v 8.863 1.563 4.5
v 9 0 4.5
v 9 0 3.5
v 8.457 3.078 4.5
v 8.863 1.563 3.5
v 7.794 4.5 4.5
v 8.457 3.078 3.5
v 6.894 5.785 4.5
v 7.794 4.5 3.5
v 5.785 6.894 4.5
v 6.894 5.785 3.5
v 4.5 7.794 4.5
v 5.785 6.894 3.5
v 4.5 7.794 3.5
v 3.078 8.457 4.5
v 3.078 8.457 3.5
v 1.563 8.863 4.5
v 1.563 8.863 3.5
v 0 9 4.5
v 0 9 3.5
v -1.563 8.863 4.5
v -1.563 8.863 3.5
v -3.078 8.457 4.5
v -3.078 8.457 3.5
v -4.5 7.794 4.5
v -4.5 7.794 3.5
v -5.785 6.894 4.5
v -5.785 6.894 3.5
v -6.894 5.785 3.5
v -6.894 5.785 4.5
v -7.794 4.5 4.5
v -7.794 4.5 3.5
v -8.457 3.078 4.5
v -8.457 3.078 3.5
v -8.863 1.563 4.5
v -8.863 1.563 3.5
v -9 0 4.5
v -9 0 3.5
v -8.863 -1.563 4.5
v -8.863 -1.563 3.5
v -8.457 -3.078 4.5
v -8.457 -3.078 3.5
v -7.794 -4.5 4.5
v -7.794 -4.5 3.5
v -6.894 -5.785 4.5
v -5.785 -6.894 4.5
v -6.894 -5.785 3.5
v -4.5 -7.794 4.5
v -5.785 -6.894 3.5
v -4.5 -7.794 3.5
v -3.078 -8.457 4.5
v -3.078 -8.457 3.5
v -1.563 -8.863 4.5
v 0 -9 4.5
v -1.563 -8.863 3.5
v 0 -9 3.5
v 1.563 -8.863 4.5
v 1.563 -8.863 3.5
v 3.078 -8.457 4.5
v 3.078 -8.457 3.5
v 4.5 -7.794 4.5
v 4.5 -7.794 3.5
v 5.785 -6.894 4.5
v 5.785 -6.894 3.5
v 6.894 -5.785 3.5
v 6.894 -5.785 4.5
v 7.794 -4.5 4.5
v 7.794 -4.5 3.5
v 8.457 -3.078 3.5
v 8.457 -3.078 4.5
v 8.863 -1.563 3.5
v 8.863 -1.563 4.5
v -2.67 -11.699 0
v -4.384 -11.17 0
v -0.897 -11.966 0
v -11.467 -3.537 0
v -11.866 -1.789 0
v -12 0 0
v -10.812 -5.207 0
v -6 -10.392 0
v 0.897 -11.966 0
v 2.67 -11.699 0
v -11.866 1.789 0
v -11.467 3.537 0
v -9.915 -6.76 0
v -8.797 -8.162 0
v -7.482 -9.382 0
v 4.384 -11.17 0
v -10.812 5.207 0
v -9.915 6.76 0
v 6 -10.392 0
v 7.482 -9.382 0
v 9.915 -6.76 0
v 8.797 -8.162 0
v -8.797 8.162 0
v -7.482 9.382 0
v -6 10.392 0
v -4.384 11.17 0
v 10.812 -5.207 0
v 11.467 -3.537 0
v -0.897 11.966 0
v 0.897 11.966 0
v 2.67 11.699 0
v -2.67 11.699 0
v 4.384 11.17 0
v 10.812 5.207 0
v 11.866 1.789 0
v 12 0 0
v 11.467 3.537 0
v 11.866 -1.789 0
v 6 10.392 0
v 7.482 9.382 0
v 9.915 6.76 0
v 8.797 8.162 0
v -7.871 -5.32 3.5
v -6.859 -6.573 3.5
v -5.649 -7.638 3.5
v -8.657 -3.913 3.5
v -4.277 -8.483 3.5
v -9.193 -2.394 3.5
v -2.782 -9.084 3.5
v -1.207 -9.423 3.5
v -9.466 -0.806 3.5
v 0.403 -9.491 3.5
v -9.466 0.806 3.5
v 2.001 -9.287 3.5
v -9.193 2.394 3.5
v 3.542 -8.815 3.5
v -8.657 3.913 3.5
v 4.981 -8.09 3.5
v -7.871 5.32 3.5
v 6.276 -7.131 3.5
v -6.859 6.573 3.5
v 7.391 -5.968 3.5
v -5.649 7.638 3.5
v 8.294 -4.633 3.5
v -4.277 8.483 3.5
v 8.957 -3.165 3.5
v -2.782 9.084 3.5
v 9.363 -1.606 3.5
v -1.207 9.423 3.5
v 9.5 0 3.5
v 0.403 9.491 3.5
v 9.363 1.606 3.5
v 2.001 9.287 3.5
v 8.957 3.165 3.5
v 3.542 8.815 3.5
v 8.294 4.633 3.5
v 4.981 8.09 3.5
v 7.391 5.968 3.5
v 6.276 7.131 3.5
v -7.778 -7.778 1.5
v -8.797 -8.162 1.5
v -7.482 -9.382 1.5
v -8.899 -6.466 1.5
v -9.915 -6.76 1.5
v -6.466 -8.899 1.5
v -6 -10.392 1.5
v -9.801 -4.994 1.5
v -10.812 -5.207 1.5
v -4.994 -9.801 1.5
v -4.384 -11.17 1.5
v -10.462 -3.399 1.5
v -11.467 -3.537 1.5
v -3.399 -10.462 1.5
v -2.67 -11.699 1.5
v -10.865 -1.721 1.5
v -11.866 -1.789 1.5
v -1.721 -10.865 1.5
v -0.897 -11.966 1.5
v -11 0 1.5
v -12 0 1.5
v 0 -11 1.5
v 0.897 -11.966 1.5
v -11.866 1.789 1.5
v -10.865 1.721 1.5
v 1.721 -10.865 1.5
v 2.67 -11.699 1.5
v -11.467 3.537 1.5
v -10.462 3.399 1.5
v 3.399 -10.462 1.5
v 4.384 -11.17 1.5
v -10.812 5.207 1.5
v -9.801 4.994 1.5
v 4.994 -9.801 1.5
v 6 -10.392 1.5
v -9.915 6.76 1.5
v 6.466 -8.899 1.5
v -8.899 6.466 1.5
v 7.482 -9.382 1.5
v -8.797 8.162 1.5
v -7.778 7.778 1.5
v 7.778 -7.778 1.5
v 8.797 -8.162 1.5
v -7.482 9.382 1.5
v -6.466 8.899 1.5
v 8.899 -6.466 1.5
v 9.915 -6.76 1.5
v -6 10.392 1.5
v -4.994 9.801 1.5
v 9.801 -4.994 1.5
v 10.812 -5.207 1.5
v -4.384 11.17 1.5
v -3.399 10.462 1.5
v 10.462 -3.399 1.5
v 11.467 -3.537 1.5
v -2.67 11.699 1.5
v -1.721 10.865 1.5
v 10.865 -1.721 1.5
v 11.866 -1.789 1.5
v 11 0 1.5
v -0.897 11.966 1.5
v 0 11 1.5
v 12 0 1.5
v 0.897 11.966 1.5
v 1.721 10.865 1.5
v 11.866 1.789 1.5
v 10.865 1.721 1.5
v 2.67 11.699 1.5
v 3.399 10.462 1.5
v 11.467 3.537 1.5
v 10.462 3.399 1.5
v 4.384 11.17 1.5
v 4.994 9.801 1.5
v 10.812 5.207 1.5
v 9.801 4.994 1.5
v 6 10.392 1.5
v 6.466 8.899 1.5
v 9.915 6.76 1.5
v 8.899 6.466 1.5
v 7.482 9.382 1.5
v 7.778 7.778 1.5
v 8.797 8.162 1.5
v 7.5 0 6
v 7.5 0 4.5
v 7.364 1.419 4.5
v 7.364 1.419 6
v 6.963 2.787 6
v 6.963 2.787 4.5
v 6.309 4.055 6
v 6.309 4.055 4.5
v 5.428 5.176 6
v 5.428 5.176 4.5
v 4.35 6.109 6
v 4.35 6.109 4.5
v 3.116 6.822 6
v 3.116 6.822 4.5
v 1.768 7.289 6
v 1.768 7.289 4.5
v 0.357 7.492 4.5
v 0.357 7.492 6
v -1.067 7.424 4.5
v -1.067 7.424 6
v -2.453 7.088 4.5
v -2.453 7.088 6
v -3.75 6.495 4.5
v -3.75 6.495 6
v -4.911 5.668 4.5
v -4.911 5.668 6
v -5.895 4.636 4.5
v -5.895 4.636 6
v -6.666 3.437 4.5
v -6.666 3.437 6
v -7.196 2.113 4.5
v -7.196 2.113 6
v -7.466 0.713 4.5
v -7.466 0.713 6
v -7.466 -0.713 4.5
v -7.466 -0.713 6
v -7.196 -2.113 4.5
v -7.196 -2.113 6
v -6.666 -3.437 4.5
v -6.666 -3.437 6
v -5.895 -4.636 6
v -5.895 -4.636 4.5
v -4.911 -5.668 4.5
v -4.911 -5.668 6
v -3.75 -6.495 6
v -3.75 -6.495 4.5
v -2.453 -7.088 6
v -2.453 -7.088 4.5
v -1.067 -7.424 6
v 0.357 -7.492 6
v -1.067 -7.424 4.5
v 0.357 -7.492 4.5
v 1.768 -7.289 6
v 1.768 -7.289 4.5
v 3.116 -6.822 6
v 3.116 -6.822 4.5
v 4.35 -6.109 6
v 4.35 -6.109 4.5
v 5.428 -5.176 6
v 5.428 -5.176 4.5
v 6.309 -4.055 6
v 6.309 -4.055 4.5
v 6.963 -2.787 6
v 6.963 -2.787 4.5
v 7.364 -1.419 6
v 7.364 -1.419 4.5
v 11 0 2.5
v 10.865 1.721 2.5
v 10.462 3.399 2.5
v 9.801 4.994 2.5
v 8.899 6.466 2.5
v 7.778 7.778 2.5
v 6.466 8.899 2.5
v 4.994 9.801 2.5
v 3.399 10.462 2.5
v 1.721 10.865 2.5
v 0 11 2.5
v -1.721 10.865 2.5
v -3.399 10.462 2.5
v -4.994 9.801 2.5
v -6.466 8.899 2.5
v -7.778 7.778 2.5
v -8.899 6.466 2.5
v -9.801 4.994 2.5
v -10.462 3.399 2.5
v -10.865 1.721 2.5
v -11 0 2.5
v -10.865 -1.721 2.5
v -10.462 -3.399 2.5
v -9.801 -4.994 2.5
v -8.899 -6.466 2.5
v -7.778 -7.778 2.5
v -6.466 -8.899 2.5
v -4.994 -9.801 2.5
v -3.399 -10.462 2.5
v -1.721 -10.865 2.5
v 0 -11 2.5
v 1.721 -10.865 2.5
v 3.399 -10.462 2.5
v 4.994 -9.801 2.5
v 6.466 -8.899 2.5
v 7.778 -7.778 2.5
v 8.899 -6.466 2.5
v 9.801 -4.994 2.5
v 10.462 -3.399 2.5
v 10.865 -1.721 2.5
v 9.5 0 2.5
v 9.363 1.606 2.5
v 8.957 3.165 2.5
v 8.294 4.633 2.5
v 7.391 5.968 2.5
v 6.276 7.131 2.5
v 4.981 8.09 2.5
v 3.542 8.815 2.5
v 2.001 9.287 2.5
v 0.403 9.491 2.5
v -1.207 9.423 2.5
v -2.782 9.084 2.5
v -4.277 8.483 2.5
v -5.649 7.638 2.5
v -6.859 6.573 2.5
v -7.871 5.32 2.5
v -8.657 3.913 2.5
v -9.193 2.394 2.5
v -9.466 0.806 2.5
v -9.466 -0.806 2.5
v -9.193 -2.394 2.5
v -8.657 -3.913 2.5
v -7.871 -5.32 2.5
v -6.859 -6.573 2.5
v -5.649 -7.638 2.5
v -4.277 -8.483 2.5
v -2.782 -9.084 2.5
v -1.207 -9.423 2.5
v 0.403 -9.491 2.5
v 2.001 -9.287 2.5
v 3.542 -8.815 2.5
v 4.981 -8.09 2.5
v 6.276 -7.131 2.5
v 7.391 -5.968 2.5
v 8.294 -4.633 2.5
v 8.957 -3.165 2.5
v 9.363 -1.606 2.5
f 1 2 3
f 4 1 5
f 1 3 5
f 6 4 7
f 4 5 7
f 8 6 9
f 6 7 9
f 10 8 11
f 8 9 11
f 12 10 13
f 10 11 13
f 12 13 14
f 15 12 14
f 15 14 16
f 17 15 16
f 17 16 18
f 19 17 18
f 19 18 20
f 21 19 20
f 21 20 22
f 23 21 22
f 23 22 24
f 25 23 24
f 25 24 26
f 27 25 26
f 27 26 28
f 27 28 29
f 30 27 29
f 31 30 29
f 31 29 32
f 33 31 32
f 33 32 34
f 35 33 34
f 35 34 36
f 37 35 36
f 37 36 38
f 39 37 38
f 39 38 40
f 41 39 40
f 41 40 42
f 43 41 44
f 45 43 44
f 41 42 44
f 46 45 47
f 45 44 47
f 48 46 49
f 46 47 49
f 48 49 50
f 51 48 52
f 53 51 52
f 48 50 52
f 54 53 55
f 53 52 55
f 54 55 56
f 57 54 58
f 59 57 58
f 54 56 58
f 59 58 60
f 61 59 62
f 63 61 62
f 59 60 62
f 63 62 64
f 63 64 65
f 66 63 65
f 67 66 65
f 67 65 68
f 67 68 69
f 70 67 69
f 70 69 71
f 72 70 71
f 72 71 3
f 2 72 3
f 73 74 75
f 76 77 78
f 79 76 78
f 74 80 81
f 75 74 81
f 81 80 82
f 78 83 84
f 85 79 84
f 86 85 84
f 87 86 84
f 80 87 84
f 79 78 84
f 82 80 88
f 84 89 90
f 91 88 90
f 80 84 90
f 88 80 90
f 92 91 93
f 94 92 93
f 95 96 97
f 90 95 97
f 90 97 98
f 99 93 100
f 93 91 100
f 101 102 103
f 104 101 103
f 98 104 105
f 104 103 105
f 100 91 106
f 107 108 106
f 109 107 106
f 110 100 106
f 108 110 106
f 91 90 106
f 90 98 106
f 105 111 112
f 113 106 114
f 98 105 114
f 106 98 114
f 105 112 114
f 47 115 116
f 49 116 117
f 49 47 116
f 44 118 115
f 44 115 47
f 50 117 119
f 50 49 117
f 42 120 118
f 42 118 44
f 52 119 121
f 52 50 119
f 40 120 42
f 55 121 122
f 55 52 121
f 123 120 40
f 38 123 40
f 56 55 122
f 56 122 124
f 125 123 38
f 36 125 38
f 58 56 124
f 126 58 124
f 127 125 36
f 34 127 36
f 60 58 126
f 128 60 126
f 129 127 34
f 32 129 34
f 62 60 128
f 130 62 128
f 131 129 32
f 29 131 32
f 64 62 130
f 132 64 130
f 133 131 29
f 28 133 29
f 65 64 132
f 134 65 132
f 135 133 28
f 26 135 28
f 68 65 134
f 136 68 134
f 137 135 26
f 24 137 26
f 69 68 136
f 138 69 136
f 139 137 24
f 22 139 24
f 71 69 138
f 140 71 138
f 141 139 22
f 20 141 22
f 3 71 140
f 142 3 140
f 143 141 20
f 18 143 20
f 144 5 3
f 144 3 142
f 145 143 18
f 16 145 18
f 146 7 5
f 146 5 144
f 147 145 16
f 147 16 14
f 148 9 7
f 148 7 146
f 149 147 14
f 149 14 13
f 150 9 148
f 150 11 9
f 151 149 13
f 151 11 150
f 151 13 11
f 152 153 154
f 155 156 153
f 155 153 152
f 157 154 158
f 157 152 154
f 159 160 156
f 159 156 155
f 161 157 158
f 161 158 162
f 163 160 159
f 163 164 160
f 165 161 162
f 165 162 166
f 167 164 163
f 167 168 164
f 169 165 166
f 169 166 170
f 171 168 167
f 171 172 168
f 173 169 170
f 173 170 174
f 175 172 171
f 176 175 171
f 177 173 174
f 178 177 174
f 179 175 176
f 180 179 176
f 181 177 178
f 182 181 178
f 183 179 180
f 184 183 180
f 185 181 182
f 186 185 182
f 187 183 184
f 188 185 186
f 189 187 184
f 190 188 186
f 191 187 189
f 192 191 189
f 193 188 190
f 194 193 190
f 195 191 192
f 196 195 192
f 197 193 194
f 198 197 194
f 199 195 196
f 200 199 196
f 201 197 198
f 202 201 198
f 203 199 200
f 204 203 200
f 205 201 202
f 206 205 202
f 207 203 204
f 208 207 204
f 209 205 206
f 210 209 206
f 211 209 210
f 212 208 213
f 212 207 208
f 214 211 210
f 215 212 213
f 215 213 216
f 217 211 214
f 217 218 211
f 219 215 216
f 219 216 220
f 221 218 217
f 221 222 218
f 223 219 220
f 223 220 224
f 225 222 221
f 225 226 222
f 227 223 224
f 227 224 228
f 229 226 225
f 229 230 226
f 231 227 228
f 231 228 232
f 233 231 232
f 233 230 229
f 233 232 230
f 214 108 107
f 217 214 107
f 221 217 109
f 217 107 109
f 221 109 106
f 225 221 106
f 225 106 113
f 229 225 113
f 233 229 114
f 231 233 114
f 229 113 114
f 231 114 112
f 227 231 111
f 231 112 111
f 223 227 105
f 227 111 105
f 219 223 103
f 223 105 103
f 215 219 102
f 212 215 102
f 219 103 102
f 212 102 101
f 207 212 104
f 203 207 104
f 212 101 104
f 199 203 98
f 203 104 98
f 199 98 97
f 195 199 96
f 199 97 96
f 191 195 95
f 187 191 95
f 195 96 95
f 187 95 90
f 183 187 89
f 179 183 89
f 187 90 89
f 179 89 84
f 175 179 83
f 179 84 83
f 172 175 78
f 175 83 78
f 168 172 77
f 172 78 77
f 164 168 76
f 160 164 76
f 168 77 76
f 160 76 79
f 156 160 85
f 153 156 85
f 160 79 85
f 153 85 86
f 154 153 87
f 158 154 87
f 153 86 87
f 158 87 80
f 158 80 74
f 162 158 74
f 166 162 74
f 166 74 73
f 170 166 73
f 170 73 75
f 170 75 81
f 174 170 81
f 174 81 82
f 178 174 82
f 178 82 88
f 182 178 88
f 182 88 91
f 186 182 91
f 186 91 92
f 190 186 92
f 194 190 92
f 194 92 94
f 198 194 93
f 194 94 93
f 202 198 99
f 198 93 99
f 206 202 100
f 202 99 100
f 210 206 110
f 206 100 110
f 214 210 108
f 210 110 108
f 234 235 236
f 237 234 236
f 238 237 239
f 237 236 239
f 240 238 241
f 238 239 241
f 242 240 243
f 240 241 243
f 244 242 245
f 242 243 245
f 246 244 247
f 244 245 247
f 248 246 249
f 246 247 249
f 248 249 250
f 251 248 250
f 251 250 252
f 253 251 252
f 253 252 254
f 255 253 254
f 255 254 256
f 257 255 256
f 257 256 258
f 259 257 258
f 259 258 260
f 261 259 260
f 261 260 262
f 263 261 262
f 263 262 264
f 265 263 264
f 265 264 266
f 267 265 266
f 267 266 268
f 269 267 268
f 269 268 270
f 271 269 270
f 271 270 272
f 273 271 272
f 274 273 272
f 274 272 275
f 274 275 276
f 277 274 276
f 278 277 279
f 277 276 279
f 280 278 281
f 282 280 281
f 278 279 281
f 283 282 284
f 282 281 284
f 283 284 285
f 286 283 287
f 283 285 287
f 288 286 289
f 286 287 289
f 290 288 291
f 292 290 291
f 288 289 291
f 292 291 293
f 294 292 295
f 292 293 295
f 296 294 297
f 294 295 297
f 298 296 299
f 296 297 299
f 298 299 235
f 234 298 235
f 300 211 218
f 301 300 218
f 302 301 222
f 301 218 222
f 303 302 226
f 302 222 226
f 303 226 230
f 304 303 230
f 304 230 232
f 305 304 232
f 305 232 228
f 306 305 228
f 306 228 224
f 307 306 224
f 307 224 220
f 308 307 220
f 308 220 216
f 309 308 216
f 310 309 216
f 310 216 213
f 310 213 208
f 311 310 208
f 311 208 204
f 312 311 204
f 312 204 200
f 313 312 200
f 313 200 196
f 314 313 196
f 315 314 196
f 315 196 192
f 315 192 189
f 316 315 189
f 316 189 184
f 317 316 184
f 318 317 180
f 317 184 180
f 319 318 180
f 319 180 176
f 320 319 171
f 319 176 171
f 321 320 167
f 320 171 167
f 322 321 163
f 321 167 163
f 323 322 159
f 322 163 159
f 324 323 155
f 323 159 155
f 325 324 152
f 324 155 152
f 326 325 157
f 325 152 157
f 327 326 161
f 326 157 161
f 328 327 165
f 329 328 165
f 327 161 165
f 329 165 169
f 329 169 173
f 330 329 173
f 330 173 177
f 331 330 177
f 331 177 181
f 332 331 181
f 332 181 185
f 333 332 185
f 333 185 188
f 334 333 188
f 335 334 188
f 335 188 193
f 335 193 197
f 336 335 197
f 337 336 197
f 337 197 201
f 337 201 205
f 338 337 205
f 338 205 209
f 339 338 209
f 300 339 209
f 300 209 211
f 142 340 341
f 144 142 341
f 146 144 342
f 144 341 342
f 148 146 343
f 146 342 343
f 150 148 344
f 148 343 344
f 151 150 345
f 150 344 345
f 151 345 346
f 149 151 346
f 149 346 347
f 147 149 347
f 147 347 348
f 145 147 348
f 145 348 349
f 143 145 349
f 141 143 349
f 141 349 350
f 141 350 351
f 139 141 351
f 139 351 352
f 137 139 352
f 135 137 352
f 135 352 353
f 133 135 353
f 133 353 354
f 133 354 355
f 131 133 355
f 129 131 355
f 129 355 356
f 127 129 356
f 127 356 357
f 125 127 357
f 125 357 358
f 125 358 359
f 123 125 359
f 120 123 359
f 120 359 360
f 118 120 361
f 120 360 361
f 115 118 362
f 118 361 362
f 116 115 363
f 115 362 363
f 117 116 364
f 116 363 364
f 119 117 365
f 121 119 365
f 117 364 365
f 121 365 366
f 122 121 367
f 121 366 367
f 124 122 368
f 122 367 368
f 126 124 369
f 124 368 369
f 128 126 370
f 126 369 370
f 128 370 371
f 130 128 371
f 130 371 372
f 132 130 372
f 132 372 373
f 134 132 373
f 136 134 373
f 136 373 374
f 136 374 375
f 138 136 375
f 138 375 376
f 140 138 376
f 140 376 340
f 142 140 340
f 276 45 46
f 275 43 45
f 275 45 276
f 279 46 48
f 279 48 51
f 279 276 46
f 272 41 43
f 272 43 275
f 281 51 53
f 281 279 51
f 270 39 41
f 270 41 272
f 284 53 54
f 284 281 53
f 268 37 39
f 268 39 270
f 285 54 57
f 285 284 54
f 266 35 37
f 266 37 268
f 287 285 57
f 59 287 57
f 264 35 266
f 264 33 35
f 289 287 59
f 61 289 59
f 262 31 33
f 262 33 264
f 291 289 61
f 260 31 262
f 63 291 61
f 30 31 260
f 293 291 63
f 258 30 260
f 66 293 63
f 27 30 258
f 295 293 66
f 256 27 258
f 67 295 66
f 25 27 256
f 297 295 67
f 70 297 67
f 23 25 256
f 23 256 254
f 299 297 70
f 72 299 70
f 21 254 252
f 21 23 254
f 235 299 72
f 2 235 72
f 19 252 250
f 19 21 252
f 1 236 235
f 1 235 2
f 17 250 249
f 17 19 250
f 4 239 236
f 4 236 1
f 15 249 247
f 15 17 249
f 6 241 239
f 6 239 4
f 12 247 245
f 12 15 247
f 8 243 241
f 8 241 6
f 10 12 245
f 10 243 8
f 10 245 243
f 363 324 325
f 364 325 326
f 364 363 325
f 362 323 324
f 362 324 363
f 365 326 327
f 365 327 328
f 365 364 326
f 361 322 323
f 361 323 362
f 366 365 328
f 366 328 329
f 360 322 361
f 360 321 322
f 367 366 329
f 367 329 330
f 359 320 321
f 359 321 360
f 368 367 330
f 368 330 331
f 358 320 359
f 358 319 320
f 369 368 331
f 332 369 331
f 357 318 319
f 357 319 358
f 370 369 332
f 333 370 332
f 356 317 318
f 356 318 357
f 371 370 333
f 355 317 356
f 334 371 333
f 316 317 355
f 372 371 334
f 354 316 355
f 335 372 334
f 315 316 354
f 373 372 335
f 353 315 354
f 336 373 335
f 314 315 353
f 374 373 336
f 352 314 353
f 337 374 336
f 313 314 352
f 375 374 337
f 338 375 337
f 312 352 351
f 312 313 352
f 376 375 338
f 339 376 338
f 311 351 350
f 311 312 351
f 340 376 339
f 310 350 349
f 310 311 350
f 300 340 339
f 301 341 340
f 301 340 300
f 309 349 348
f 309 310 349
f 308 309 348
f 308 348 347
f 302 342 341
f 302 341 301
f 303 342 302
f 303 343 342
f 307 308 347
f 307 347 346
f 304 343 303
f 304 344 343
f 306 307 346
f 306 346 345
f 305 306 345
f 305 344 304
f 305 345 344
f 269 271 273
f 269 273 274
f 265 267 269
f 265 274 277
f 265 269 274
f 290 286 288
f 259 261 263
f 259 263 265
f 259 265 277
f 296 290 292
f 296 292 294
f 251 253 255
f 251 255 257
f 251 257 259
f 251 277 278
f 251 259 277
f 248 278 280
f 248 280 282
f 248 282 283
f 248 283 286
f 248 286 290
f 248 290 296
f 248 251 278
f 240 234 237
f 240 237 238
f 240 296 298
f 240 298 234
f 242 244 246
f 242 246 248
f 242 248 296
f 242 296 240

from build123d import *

# Parameters (mm, degrees)
SKETCH001_R      = 9
EXTRUDE001_DEPTH = 4.5
SKETCH002_R      = 9.5
EXTRUDE002_DEPTH = 3.5
SKETCH003_R      = 11
EXTRUDE003_DEPTH = 2.5
SKETCH004_R      = 12
EXTRUDE004_DEPTH = 1.5
SKETCH_R         = 7.5
EXTRUDE_DEPTH    = 6


with BuildPart() as extrude001:
    # Sketch001 → Extrude001 (new body)
    with BuildSketch(Plane.XY):
        Circle(SKETCH001_R)
    extrude(amount=EXTRUDE001_DEPTH)


with BuildPart() as extrude002:
    # Sketch002 → Extrude002 (new body)
    with BuildSketch(Plane.XY):
        Circle(SKETCH002_R)
    extrude(amount=EXTRUDE002_DEPTH)


with BuildPart() as extrude003:
    # Sketch003 → Extrude003 (new body)
    with BuildSketch(Plane.XY):
        Circle(SKETCH003_R)
    extrude(amount=EXTRUDE003_DEPTH)


with BuildPart() as extrude004:
    # Sketch004 → Extrude004 (new body)
    with BuildSketch(Plane.XY):
        Circle(SKETCH004_R)
    extrude(amount=EXTRUDE004_DEPTH)


with BuildPart() as fusion:
    # Sketch → Extrude (new body)
    with BuildSketch(Plane.XY):
        Circle(SKETCH_R)
    extrude(amount=EXTRUDE_DEPTH)

    # Fusion: union Extrude001, Extrude002, Extrude003, Extrude004
    add(extrude001.part)
    add(extrude002.part)
    add(extrude003.part)
    add(extrude004.part)


solid = fusion.part
